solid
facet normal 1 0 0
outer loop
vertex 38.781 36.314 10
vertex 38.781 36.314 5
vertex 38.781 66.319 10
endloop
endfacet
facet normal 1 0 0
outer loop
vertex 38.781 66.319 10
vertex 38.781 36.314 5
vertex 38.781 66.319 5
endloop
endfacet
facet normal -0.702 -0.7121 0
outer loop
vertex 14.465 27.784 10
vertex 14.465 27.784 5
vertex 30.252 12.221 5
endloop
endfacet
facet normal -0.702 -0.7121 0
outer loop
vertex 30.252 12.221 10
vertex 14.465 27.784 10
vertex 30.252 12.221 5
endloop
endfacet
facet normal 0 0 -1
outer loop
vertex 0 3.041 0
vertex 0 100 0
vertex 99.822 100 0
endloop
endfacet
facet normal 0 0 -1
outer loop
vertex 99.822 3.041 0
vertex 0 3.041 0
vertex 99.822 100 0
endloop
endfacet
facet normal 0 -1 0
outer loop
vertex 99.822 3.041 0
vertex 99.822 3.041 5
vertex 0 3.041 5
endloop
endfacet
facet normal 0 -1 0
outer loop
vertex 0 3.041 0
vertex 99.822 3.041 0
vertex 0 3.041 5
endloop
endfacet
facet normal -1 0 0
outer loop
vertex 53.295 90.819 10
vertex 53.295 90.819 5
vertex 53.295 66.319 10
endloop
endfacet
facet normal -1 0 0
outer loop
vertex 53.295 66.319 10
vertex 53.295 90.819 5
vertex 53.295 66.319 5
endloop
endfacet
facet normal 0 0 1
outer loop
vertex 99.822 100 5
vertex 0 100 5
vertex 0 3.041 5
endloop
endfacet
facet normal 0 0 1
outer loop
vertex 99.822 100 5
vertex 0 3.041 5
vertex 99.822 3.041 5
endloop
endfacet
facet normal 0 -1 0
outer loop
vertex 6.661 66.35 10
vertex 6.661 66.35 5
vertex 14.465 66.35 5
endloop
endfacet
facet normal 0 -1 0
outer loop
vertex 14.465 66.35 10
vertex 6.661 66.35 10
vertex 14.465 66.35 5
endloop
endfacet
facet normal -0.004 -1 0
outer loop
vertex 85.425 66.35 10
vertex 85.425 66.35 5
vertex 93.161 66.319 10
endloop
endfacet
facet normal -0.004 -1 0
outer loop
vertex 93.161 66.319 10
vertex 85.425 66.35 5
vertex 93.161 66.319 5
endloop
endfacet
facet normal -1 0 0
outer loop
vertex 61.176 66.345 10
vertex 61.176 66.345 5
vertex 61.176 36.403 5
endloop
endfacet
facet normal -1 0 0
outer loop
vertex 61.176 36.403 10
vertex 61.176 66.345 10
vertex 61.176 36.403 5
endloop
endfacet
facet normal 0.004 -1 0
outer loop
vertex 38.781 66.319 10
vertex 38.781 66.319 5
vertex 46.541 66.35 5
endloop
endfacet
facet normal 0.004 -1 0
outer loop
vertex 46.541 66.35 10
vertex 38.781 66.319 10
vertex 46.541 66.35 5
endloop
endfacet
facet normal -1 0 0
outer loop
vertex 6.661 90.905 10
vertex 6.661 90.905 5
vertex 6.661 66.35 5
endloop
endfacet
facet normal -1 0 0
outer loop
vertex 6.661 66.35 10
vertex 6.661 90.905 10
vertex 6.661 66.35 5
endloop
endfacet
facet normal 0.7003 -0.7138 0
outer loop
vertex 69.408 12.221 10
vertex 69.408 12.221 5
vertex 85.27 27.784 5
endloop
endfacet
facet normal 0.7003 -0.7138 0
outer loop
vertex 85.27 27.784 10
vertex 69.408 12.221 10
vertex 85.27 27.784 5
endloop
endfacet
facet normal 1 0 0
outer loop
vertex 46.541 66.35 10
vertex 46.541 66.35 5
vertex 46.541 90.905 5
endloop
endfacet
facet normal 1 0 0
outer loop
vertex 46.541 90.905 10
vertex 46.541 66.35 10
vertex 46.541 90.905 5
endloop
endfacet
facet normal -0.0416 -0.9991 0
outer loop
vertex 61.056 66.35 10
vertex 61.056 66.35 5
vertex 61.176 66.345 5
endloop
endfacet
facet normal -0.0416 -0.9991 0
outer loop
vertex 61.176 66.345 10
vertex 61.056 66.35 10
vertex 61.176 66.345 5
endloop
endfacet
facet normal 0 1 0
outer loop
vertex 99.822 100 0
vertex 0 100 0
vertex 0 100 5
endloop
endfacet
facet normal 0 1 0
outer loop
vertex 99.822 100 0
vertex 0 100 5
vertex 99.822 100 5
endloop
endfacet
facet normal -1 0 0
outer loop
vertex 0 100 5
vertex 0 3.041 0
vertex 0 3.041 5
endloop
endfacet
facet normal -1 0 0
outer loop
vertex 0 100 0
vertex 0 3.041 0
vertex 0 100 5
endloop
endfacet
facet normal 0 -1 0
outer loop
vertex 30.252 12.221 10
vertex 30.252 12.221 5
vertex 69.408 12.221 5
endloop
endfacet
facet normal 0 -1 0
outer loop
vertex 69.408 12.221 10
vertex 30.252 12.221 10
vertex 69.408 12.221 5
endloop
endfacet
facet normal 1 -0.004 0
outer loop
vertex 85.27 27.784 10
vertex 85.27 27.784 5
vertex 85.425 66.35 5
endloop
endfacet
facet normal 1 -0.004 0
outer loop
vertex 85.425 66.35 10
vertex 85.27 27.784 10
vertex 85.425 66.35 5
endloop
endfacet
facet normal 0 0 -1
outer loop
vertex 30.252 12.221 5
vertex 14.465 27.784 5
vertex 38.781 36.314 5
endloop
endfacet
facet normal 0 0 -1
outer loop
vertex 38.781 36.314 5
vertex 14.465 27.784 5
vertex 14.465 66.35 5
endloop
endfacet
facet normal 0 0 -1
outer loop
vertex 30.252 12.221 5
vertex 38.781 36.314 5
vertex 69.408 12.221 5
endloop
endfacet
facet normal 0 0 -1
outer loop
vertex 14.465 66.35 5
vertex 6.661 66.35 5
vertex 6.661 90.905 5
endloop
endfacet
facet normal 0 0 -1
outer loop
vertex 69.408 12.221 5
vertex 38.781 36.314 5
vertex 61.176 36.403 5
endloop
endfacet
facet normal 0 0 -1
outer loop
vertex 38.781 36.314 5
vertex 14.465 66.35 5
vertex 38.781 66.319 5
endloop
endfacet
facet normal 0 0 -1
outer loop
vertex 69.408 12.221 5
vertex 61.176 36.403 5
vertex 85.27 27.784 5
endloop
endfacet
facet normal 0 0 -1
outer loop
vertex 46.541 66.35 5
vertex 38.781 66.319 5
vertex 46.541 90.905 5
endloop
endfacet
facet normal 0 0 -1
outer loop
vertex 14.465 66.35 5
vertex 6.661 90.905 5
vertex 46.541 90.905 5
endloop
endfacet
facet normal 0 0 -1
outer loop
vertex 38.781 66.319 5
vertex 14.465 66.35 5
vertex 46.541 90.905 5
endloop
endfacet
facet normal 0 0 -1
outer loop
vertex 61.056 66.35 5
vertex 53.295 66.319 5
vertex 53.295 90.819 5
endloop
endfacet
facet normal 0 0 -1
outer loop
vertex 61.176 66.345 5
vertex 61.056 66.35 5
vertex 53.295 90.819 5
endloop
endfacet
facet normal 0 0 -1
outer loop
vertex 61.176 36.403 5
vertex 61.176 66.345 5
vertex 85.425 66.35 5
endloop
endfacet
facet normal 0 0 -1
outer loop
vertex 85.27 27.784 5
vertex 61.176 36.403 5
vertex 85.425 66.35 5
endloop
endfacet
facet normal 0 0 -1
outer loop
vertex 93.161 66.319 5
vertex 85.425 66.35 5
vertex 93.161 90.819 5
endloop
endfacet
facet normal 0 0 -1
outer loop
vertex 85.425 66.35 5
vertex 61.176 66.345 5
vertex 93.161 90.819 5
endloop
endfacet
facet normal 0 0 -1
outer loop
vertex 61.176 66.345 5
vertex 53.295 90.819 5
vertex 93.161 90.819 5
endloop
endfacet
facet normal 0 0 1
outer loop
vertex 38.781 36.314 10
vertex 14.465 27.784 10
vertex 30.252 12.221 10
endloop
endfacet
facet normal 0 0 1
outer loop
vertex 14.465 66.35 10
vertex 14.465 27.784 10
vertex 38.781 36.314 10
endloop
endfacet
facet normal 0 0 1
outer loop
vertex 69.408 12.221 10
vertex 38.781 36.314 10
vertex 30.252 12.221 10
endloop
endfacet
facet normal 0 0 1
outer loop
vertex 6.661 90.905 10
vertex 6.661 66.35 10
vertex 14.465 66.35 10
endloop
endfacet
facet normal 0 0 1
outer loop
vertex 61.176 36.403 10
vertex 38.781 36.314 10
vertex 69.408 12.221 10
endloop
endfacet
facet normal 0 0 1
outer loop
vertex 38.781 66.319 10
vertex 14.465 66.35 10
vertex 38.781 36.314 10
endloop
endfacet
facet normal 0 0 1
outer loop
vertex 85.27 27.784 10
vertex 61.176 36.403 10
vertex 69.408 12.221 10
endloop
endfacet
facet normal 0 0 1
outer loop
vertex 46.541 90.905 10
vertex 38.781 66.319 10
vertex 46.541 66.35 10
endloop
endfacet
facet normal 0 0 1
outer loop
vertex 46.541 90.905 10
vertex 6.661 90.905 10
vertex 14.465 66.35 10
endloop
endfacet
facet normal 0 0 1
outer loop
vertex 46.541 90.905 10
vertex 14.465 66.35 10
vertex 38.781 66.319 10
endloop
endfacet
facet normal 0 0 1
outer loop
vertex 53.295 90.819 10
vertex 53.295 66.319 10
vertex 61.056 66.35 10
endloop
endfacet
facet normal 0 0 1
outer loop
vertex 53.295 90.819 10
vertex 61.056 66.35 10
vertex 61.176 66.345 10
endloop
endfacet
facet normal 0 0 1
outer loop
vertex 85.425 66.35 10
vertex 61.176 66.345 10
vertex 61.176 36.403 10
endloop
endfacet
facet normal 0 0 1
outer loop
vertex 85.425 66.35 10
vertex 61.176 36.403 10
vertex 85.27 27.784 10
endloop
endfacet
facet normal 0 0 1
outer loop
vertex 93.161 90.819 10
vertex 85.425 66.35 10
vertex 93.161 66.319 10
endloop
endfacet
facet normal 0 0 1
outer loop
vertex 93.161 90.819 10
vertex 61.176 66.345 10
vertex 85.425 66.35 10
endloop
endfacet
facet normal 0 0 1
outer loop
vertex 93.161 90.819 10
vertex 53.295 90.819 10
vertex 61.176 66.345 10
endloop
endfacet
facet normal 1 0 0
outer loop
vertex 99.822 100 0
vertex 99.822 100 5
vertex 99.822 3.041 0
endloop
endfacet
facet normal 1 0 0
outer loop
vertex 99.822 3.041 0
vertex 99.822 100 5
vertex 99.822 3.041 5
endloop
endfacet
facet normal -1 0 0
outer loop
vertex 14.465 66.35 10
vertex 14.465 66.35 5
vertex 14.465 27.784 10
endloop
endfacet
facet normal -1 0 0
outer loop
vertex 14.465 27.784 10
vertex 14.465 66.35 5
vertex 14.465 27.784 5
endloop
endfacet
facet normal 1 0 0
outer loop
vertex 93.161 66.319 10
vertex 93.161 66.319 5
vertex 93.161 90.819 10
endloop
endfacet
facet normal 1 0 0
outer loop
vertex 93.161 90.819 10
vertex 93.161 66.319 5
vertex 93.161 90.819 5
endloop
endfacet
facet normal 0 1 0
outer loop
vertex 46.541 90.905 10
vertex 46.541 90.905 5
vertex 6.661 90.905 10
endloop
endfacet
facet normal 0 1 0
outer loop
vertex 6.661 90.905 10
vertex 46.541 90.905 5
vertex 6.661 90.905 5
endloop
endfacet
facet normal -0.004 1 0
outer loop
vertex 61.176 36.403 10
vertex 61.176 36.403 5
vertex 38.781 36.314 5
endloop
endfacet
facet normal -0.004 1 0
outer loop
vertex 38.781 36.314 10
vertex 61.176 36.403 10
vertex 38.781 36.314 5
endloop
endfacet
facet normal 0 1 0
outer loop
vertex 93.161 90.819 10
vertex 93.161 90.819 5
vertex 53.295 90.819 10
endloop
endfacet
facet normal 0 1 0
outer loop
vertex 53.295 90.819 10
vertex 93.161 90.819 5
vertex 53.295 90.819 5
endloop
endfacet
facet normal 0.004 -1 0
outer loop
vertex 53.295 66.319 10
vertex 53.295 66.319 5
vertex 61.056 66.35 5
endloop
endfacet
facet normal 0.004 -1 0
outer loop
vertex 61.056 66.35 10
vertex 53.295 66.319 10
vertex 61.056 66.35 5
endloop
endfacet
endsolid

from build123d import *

# Parameters (mm, degrees)
F1_W     = 100
F1_H     = 100
F2_DEPTH = 5
F5_DEPTH = 5
F7_DEPTH = 54.1
F9_DEPTH = 25


with BuildPart() as f2:
    # F1 (on Top) → F2 (new body)
    with BuildSketch(Plane.XY):
        with Locations((50, 50)):
            Rectangle(F1_W, F1_H)
    extrude(amount=F2_DEPTH)

    # F6 (on face) → F7 (cut)
    with BuildSketch(Plane.XY.offset(10)):
        Polygon((100.1621037722, 3.0405181703), (37.4508686364, 3.0405181703), (0, 3.0405181703), (0, 0), (100.1621037722, 0), align=None)
    extrude(amount=-F7_DEPTH, mode=Mode.SUBTRACT)

    # F8 (on face) → F9 (cut)
    with BuildSketch(Plane.XY.offset(10)):
        Polygon((99.8216490268, 103.9248853922), (99.8216490268, 74.5721507005), (99.8216490268, -5.4602026939), (108.0576479435, -5.4602026939), (108.0576479435, 103.9248853922), align=None)
    extrude(amount=-F9_DEPTH, mode=Mode.SUBTRACT)


with BuildPart() as f5:
    # F4 (on face) → F5 (new body)
    with BuildSketch(Plane.XY.offset(5)):
        Polygon((46.5413259785, 90.9048467875), (6.6605079919, 90.9048467875), (6.6605079919, 90.8547322993), (6.6605079919, 66.3502812386), (14.4654614851, 66.3502812386), (14.4654614851, 27.7836583555), (30.2518866956, 12.2214881703), (69.4081783295, 12.2214881703), (85.2703973651, 27.7836583555), (85.4252055287, 66.3502812386), (93.1611926851, 66.3192286372), (93.1611926851, 90.8190310001), (53.2952547073, 90.8190310001), (53.2952547073, 66.3192286372), (61.0556825995, 66.3502812386), (61.1755126527, 66.3452222943), (61.1755126527, 36.4032736805), (38.7808980863, 36.3136637972), (38.7808980863, 66.3192286372), (46.5413259785, 66.3502812386), (46.5413259785, 90.8190310001), align=None)
    extrude(amount=F5_DEPTH)


solid = Compound([f2.part, f5.part])
